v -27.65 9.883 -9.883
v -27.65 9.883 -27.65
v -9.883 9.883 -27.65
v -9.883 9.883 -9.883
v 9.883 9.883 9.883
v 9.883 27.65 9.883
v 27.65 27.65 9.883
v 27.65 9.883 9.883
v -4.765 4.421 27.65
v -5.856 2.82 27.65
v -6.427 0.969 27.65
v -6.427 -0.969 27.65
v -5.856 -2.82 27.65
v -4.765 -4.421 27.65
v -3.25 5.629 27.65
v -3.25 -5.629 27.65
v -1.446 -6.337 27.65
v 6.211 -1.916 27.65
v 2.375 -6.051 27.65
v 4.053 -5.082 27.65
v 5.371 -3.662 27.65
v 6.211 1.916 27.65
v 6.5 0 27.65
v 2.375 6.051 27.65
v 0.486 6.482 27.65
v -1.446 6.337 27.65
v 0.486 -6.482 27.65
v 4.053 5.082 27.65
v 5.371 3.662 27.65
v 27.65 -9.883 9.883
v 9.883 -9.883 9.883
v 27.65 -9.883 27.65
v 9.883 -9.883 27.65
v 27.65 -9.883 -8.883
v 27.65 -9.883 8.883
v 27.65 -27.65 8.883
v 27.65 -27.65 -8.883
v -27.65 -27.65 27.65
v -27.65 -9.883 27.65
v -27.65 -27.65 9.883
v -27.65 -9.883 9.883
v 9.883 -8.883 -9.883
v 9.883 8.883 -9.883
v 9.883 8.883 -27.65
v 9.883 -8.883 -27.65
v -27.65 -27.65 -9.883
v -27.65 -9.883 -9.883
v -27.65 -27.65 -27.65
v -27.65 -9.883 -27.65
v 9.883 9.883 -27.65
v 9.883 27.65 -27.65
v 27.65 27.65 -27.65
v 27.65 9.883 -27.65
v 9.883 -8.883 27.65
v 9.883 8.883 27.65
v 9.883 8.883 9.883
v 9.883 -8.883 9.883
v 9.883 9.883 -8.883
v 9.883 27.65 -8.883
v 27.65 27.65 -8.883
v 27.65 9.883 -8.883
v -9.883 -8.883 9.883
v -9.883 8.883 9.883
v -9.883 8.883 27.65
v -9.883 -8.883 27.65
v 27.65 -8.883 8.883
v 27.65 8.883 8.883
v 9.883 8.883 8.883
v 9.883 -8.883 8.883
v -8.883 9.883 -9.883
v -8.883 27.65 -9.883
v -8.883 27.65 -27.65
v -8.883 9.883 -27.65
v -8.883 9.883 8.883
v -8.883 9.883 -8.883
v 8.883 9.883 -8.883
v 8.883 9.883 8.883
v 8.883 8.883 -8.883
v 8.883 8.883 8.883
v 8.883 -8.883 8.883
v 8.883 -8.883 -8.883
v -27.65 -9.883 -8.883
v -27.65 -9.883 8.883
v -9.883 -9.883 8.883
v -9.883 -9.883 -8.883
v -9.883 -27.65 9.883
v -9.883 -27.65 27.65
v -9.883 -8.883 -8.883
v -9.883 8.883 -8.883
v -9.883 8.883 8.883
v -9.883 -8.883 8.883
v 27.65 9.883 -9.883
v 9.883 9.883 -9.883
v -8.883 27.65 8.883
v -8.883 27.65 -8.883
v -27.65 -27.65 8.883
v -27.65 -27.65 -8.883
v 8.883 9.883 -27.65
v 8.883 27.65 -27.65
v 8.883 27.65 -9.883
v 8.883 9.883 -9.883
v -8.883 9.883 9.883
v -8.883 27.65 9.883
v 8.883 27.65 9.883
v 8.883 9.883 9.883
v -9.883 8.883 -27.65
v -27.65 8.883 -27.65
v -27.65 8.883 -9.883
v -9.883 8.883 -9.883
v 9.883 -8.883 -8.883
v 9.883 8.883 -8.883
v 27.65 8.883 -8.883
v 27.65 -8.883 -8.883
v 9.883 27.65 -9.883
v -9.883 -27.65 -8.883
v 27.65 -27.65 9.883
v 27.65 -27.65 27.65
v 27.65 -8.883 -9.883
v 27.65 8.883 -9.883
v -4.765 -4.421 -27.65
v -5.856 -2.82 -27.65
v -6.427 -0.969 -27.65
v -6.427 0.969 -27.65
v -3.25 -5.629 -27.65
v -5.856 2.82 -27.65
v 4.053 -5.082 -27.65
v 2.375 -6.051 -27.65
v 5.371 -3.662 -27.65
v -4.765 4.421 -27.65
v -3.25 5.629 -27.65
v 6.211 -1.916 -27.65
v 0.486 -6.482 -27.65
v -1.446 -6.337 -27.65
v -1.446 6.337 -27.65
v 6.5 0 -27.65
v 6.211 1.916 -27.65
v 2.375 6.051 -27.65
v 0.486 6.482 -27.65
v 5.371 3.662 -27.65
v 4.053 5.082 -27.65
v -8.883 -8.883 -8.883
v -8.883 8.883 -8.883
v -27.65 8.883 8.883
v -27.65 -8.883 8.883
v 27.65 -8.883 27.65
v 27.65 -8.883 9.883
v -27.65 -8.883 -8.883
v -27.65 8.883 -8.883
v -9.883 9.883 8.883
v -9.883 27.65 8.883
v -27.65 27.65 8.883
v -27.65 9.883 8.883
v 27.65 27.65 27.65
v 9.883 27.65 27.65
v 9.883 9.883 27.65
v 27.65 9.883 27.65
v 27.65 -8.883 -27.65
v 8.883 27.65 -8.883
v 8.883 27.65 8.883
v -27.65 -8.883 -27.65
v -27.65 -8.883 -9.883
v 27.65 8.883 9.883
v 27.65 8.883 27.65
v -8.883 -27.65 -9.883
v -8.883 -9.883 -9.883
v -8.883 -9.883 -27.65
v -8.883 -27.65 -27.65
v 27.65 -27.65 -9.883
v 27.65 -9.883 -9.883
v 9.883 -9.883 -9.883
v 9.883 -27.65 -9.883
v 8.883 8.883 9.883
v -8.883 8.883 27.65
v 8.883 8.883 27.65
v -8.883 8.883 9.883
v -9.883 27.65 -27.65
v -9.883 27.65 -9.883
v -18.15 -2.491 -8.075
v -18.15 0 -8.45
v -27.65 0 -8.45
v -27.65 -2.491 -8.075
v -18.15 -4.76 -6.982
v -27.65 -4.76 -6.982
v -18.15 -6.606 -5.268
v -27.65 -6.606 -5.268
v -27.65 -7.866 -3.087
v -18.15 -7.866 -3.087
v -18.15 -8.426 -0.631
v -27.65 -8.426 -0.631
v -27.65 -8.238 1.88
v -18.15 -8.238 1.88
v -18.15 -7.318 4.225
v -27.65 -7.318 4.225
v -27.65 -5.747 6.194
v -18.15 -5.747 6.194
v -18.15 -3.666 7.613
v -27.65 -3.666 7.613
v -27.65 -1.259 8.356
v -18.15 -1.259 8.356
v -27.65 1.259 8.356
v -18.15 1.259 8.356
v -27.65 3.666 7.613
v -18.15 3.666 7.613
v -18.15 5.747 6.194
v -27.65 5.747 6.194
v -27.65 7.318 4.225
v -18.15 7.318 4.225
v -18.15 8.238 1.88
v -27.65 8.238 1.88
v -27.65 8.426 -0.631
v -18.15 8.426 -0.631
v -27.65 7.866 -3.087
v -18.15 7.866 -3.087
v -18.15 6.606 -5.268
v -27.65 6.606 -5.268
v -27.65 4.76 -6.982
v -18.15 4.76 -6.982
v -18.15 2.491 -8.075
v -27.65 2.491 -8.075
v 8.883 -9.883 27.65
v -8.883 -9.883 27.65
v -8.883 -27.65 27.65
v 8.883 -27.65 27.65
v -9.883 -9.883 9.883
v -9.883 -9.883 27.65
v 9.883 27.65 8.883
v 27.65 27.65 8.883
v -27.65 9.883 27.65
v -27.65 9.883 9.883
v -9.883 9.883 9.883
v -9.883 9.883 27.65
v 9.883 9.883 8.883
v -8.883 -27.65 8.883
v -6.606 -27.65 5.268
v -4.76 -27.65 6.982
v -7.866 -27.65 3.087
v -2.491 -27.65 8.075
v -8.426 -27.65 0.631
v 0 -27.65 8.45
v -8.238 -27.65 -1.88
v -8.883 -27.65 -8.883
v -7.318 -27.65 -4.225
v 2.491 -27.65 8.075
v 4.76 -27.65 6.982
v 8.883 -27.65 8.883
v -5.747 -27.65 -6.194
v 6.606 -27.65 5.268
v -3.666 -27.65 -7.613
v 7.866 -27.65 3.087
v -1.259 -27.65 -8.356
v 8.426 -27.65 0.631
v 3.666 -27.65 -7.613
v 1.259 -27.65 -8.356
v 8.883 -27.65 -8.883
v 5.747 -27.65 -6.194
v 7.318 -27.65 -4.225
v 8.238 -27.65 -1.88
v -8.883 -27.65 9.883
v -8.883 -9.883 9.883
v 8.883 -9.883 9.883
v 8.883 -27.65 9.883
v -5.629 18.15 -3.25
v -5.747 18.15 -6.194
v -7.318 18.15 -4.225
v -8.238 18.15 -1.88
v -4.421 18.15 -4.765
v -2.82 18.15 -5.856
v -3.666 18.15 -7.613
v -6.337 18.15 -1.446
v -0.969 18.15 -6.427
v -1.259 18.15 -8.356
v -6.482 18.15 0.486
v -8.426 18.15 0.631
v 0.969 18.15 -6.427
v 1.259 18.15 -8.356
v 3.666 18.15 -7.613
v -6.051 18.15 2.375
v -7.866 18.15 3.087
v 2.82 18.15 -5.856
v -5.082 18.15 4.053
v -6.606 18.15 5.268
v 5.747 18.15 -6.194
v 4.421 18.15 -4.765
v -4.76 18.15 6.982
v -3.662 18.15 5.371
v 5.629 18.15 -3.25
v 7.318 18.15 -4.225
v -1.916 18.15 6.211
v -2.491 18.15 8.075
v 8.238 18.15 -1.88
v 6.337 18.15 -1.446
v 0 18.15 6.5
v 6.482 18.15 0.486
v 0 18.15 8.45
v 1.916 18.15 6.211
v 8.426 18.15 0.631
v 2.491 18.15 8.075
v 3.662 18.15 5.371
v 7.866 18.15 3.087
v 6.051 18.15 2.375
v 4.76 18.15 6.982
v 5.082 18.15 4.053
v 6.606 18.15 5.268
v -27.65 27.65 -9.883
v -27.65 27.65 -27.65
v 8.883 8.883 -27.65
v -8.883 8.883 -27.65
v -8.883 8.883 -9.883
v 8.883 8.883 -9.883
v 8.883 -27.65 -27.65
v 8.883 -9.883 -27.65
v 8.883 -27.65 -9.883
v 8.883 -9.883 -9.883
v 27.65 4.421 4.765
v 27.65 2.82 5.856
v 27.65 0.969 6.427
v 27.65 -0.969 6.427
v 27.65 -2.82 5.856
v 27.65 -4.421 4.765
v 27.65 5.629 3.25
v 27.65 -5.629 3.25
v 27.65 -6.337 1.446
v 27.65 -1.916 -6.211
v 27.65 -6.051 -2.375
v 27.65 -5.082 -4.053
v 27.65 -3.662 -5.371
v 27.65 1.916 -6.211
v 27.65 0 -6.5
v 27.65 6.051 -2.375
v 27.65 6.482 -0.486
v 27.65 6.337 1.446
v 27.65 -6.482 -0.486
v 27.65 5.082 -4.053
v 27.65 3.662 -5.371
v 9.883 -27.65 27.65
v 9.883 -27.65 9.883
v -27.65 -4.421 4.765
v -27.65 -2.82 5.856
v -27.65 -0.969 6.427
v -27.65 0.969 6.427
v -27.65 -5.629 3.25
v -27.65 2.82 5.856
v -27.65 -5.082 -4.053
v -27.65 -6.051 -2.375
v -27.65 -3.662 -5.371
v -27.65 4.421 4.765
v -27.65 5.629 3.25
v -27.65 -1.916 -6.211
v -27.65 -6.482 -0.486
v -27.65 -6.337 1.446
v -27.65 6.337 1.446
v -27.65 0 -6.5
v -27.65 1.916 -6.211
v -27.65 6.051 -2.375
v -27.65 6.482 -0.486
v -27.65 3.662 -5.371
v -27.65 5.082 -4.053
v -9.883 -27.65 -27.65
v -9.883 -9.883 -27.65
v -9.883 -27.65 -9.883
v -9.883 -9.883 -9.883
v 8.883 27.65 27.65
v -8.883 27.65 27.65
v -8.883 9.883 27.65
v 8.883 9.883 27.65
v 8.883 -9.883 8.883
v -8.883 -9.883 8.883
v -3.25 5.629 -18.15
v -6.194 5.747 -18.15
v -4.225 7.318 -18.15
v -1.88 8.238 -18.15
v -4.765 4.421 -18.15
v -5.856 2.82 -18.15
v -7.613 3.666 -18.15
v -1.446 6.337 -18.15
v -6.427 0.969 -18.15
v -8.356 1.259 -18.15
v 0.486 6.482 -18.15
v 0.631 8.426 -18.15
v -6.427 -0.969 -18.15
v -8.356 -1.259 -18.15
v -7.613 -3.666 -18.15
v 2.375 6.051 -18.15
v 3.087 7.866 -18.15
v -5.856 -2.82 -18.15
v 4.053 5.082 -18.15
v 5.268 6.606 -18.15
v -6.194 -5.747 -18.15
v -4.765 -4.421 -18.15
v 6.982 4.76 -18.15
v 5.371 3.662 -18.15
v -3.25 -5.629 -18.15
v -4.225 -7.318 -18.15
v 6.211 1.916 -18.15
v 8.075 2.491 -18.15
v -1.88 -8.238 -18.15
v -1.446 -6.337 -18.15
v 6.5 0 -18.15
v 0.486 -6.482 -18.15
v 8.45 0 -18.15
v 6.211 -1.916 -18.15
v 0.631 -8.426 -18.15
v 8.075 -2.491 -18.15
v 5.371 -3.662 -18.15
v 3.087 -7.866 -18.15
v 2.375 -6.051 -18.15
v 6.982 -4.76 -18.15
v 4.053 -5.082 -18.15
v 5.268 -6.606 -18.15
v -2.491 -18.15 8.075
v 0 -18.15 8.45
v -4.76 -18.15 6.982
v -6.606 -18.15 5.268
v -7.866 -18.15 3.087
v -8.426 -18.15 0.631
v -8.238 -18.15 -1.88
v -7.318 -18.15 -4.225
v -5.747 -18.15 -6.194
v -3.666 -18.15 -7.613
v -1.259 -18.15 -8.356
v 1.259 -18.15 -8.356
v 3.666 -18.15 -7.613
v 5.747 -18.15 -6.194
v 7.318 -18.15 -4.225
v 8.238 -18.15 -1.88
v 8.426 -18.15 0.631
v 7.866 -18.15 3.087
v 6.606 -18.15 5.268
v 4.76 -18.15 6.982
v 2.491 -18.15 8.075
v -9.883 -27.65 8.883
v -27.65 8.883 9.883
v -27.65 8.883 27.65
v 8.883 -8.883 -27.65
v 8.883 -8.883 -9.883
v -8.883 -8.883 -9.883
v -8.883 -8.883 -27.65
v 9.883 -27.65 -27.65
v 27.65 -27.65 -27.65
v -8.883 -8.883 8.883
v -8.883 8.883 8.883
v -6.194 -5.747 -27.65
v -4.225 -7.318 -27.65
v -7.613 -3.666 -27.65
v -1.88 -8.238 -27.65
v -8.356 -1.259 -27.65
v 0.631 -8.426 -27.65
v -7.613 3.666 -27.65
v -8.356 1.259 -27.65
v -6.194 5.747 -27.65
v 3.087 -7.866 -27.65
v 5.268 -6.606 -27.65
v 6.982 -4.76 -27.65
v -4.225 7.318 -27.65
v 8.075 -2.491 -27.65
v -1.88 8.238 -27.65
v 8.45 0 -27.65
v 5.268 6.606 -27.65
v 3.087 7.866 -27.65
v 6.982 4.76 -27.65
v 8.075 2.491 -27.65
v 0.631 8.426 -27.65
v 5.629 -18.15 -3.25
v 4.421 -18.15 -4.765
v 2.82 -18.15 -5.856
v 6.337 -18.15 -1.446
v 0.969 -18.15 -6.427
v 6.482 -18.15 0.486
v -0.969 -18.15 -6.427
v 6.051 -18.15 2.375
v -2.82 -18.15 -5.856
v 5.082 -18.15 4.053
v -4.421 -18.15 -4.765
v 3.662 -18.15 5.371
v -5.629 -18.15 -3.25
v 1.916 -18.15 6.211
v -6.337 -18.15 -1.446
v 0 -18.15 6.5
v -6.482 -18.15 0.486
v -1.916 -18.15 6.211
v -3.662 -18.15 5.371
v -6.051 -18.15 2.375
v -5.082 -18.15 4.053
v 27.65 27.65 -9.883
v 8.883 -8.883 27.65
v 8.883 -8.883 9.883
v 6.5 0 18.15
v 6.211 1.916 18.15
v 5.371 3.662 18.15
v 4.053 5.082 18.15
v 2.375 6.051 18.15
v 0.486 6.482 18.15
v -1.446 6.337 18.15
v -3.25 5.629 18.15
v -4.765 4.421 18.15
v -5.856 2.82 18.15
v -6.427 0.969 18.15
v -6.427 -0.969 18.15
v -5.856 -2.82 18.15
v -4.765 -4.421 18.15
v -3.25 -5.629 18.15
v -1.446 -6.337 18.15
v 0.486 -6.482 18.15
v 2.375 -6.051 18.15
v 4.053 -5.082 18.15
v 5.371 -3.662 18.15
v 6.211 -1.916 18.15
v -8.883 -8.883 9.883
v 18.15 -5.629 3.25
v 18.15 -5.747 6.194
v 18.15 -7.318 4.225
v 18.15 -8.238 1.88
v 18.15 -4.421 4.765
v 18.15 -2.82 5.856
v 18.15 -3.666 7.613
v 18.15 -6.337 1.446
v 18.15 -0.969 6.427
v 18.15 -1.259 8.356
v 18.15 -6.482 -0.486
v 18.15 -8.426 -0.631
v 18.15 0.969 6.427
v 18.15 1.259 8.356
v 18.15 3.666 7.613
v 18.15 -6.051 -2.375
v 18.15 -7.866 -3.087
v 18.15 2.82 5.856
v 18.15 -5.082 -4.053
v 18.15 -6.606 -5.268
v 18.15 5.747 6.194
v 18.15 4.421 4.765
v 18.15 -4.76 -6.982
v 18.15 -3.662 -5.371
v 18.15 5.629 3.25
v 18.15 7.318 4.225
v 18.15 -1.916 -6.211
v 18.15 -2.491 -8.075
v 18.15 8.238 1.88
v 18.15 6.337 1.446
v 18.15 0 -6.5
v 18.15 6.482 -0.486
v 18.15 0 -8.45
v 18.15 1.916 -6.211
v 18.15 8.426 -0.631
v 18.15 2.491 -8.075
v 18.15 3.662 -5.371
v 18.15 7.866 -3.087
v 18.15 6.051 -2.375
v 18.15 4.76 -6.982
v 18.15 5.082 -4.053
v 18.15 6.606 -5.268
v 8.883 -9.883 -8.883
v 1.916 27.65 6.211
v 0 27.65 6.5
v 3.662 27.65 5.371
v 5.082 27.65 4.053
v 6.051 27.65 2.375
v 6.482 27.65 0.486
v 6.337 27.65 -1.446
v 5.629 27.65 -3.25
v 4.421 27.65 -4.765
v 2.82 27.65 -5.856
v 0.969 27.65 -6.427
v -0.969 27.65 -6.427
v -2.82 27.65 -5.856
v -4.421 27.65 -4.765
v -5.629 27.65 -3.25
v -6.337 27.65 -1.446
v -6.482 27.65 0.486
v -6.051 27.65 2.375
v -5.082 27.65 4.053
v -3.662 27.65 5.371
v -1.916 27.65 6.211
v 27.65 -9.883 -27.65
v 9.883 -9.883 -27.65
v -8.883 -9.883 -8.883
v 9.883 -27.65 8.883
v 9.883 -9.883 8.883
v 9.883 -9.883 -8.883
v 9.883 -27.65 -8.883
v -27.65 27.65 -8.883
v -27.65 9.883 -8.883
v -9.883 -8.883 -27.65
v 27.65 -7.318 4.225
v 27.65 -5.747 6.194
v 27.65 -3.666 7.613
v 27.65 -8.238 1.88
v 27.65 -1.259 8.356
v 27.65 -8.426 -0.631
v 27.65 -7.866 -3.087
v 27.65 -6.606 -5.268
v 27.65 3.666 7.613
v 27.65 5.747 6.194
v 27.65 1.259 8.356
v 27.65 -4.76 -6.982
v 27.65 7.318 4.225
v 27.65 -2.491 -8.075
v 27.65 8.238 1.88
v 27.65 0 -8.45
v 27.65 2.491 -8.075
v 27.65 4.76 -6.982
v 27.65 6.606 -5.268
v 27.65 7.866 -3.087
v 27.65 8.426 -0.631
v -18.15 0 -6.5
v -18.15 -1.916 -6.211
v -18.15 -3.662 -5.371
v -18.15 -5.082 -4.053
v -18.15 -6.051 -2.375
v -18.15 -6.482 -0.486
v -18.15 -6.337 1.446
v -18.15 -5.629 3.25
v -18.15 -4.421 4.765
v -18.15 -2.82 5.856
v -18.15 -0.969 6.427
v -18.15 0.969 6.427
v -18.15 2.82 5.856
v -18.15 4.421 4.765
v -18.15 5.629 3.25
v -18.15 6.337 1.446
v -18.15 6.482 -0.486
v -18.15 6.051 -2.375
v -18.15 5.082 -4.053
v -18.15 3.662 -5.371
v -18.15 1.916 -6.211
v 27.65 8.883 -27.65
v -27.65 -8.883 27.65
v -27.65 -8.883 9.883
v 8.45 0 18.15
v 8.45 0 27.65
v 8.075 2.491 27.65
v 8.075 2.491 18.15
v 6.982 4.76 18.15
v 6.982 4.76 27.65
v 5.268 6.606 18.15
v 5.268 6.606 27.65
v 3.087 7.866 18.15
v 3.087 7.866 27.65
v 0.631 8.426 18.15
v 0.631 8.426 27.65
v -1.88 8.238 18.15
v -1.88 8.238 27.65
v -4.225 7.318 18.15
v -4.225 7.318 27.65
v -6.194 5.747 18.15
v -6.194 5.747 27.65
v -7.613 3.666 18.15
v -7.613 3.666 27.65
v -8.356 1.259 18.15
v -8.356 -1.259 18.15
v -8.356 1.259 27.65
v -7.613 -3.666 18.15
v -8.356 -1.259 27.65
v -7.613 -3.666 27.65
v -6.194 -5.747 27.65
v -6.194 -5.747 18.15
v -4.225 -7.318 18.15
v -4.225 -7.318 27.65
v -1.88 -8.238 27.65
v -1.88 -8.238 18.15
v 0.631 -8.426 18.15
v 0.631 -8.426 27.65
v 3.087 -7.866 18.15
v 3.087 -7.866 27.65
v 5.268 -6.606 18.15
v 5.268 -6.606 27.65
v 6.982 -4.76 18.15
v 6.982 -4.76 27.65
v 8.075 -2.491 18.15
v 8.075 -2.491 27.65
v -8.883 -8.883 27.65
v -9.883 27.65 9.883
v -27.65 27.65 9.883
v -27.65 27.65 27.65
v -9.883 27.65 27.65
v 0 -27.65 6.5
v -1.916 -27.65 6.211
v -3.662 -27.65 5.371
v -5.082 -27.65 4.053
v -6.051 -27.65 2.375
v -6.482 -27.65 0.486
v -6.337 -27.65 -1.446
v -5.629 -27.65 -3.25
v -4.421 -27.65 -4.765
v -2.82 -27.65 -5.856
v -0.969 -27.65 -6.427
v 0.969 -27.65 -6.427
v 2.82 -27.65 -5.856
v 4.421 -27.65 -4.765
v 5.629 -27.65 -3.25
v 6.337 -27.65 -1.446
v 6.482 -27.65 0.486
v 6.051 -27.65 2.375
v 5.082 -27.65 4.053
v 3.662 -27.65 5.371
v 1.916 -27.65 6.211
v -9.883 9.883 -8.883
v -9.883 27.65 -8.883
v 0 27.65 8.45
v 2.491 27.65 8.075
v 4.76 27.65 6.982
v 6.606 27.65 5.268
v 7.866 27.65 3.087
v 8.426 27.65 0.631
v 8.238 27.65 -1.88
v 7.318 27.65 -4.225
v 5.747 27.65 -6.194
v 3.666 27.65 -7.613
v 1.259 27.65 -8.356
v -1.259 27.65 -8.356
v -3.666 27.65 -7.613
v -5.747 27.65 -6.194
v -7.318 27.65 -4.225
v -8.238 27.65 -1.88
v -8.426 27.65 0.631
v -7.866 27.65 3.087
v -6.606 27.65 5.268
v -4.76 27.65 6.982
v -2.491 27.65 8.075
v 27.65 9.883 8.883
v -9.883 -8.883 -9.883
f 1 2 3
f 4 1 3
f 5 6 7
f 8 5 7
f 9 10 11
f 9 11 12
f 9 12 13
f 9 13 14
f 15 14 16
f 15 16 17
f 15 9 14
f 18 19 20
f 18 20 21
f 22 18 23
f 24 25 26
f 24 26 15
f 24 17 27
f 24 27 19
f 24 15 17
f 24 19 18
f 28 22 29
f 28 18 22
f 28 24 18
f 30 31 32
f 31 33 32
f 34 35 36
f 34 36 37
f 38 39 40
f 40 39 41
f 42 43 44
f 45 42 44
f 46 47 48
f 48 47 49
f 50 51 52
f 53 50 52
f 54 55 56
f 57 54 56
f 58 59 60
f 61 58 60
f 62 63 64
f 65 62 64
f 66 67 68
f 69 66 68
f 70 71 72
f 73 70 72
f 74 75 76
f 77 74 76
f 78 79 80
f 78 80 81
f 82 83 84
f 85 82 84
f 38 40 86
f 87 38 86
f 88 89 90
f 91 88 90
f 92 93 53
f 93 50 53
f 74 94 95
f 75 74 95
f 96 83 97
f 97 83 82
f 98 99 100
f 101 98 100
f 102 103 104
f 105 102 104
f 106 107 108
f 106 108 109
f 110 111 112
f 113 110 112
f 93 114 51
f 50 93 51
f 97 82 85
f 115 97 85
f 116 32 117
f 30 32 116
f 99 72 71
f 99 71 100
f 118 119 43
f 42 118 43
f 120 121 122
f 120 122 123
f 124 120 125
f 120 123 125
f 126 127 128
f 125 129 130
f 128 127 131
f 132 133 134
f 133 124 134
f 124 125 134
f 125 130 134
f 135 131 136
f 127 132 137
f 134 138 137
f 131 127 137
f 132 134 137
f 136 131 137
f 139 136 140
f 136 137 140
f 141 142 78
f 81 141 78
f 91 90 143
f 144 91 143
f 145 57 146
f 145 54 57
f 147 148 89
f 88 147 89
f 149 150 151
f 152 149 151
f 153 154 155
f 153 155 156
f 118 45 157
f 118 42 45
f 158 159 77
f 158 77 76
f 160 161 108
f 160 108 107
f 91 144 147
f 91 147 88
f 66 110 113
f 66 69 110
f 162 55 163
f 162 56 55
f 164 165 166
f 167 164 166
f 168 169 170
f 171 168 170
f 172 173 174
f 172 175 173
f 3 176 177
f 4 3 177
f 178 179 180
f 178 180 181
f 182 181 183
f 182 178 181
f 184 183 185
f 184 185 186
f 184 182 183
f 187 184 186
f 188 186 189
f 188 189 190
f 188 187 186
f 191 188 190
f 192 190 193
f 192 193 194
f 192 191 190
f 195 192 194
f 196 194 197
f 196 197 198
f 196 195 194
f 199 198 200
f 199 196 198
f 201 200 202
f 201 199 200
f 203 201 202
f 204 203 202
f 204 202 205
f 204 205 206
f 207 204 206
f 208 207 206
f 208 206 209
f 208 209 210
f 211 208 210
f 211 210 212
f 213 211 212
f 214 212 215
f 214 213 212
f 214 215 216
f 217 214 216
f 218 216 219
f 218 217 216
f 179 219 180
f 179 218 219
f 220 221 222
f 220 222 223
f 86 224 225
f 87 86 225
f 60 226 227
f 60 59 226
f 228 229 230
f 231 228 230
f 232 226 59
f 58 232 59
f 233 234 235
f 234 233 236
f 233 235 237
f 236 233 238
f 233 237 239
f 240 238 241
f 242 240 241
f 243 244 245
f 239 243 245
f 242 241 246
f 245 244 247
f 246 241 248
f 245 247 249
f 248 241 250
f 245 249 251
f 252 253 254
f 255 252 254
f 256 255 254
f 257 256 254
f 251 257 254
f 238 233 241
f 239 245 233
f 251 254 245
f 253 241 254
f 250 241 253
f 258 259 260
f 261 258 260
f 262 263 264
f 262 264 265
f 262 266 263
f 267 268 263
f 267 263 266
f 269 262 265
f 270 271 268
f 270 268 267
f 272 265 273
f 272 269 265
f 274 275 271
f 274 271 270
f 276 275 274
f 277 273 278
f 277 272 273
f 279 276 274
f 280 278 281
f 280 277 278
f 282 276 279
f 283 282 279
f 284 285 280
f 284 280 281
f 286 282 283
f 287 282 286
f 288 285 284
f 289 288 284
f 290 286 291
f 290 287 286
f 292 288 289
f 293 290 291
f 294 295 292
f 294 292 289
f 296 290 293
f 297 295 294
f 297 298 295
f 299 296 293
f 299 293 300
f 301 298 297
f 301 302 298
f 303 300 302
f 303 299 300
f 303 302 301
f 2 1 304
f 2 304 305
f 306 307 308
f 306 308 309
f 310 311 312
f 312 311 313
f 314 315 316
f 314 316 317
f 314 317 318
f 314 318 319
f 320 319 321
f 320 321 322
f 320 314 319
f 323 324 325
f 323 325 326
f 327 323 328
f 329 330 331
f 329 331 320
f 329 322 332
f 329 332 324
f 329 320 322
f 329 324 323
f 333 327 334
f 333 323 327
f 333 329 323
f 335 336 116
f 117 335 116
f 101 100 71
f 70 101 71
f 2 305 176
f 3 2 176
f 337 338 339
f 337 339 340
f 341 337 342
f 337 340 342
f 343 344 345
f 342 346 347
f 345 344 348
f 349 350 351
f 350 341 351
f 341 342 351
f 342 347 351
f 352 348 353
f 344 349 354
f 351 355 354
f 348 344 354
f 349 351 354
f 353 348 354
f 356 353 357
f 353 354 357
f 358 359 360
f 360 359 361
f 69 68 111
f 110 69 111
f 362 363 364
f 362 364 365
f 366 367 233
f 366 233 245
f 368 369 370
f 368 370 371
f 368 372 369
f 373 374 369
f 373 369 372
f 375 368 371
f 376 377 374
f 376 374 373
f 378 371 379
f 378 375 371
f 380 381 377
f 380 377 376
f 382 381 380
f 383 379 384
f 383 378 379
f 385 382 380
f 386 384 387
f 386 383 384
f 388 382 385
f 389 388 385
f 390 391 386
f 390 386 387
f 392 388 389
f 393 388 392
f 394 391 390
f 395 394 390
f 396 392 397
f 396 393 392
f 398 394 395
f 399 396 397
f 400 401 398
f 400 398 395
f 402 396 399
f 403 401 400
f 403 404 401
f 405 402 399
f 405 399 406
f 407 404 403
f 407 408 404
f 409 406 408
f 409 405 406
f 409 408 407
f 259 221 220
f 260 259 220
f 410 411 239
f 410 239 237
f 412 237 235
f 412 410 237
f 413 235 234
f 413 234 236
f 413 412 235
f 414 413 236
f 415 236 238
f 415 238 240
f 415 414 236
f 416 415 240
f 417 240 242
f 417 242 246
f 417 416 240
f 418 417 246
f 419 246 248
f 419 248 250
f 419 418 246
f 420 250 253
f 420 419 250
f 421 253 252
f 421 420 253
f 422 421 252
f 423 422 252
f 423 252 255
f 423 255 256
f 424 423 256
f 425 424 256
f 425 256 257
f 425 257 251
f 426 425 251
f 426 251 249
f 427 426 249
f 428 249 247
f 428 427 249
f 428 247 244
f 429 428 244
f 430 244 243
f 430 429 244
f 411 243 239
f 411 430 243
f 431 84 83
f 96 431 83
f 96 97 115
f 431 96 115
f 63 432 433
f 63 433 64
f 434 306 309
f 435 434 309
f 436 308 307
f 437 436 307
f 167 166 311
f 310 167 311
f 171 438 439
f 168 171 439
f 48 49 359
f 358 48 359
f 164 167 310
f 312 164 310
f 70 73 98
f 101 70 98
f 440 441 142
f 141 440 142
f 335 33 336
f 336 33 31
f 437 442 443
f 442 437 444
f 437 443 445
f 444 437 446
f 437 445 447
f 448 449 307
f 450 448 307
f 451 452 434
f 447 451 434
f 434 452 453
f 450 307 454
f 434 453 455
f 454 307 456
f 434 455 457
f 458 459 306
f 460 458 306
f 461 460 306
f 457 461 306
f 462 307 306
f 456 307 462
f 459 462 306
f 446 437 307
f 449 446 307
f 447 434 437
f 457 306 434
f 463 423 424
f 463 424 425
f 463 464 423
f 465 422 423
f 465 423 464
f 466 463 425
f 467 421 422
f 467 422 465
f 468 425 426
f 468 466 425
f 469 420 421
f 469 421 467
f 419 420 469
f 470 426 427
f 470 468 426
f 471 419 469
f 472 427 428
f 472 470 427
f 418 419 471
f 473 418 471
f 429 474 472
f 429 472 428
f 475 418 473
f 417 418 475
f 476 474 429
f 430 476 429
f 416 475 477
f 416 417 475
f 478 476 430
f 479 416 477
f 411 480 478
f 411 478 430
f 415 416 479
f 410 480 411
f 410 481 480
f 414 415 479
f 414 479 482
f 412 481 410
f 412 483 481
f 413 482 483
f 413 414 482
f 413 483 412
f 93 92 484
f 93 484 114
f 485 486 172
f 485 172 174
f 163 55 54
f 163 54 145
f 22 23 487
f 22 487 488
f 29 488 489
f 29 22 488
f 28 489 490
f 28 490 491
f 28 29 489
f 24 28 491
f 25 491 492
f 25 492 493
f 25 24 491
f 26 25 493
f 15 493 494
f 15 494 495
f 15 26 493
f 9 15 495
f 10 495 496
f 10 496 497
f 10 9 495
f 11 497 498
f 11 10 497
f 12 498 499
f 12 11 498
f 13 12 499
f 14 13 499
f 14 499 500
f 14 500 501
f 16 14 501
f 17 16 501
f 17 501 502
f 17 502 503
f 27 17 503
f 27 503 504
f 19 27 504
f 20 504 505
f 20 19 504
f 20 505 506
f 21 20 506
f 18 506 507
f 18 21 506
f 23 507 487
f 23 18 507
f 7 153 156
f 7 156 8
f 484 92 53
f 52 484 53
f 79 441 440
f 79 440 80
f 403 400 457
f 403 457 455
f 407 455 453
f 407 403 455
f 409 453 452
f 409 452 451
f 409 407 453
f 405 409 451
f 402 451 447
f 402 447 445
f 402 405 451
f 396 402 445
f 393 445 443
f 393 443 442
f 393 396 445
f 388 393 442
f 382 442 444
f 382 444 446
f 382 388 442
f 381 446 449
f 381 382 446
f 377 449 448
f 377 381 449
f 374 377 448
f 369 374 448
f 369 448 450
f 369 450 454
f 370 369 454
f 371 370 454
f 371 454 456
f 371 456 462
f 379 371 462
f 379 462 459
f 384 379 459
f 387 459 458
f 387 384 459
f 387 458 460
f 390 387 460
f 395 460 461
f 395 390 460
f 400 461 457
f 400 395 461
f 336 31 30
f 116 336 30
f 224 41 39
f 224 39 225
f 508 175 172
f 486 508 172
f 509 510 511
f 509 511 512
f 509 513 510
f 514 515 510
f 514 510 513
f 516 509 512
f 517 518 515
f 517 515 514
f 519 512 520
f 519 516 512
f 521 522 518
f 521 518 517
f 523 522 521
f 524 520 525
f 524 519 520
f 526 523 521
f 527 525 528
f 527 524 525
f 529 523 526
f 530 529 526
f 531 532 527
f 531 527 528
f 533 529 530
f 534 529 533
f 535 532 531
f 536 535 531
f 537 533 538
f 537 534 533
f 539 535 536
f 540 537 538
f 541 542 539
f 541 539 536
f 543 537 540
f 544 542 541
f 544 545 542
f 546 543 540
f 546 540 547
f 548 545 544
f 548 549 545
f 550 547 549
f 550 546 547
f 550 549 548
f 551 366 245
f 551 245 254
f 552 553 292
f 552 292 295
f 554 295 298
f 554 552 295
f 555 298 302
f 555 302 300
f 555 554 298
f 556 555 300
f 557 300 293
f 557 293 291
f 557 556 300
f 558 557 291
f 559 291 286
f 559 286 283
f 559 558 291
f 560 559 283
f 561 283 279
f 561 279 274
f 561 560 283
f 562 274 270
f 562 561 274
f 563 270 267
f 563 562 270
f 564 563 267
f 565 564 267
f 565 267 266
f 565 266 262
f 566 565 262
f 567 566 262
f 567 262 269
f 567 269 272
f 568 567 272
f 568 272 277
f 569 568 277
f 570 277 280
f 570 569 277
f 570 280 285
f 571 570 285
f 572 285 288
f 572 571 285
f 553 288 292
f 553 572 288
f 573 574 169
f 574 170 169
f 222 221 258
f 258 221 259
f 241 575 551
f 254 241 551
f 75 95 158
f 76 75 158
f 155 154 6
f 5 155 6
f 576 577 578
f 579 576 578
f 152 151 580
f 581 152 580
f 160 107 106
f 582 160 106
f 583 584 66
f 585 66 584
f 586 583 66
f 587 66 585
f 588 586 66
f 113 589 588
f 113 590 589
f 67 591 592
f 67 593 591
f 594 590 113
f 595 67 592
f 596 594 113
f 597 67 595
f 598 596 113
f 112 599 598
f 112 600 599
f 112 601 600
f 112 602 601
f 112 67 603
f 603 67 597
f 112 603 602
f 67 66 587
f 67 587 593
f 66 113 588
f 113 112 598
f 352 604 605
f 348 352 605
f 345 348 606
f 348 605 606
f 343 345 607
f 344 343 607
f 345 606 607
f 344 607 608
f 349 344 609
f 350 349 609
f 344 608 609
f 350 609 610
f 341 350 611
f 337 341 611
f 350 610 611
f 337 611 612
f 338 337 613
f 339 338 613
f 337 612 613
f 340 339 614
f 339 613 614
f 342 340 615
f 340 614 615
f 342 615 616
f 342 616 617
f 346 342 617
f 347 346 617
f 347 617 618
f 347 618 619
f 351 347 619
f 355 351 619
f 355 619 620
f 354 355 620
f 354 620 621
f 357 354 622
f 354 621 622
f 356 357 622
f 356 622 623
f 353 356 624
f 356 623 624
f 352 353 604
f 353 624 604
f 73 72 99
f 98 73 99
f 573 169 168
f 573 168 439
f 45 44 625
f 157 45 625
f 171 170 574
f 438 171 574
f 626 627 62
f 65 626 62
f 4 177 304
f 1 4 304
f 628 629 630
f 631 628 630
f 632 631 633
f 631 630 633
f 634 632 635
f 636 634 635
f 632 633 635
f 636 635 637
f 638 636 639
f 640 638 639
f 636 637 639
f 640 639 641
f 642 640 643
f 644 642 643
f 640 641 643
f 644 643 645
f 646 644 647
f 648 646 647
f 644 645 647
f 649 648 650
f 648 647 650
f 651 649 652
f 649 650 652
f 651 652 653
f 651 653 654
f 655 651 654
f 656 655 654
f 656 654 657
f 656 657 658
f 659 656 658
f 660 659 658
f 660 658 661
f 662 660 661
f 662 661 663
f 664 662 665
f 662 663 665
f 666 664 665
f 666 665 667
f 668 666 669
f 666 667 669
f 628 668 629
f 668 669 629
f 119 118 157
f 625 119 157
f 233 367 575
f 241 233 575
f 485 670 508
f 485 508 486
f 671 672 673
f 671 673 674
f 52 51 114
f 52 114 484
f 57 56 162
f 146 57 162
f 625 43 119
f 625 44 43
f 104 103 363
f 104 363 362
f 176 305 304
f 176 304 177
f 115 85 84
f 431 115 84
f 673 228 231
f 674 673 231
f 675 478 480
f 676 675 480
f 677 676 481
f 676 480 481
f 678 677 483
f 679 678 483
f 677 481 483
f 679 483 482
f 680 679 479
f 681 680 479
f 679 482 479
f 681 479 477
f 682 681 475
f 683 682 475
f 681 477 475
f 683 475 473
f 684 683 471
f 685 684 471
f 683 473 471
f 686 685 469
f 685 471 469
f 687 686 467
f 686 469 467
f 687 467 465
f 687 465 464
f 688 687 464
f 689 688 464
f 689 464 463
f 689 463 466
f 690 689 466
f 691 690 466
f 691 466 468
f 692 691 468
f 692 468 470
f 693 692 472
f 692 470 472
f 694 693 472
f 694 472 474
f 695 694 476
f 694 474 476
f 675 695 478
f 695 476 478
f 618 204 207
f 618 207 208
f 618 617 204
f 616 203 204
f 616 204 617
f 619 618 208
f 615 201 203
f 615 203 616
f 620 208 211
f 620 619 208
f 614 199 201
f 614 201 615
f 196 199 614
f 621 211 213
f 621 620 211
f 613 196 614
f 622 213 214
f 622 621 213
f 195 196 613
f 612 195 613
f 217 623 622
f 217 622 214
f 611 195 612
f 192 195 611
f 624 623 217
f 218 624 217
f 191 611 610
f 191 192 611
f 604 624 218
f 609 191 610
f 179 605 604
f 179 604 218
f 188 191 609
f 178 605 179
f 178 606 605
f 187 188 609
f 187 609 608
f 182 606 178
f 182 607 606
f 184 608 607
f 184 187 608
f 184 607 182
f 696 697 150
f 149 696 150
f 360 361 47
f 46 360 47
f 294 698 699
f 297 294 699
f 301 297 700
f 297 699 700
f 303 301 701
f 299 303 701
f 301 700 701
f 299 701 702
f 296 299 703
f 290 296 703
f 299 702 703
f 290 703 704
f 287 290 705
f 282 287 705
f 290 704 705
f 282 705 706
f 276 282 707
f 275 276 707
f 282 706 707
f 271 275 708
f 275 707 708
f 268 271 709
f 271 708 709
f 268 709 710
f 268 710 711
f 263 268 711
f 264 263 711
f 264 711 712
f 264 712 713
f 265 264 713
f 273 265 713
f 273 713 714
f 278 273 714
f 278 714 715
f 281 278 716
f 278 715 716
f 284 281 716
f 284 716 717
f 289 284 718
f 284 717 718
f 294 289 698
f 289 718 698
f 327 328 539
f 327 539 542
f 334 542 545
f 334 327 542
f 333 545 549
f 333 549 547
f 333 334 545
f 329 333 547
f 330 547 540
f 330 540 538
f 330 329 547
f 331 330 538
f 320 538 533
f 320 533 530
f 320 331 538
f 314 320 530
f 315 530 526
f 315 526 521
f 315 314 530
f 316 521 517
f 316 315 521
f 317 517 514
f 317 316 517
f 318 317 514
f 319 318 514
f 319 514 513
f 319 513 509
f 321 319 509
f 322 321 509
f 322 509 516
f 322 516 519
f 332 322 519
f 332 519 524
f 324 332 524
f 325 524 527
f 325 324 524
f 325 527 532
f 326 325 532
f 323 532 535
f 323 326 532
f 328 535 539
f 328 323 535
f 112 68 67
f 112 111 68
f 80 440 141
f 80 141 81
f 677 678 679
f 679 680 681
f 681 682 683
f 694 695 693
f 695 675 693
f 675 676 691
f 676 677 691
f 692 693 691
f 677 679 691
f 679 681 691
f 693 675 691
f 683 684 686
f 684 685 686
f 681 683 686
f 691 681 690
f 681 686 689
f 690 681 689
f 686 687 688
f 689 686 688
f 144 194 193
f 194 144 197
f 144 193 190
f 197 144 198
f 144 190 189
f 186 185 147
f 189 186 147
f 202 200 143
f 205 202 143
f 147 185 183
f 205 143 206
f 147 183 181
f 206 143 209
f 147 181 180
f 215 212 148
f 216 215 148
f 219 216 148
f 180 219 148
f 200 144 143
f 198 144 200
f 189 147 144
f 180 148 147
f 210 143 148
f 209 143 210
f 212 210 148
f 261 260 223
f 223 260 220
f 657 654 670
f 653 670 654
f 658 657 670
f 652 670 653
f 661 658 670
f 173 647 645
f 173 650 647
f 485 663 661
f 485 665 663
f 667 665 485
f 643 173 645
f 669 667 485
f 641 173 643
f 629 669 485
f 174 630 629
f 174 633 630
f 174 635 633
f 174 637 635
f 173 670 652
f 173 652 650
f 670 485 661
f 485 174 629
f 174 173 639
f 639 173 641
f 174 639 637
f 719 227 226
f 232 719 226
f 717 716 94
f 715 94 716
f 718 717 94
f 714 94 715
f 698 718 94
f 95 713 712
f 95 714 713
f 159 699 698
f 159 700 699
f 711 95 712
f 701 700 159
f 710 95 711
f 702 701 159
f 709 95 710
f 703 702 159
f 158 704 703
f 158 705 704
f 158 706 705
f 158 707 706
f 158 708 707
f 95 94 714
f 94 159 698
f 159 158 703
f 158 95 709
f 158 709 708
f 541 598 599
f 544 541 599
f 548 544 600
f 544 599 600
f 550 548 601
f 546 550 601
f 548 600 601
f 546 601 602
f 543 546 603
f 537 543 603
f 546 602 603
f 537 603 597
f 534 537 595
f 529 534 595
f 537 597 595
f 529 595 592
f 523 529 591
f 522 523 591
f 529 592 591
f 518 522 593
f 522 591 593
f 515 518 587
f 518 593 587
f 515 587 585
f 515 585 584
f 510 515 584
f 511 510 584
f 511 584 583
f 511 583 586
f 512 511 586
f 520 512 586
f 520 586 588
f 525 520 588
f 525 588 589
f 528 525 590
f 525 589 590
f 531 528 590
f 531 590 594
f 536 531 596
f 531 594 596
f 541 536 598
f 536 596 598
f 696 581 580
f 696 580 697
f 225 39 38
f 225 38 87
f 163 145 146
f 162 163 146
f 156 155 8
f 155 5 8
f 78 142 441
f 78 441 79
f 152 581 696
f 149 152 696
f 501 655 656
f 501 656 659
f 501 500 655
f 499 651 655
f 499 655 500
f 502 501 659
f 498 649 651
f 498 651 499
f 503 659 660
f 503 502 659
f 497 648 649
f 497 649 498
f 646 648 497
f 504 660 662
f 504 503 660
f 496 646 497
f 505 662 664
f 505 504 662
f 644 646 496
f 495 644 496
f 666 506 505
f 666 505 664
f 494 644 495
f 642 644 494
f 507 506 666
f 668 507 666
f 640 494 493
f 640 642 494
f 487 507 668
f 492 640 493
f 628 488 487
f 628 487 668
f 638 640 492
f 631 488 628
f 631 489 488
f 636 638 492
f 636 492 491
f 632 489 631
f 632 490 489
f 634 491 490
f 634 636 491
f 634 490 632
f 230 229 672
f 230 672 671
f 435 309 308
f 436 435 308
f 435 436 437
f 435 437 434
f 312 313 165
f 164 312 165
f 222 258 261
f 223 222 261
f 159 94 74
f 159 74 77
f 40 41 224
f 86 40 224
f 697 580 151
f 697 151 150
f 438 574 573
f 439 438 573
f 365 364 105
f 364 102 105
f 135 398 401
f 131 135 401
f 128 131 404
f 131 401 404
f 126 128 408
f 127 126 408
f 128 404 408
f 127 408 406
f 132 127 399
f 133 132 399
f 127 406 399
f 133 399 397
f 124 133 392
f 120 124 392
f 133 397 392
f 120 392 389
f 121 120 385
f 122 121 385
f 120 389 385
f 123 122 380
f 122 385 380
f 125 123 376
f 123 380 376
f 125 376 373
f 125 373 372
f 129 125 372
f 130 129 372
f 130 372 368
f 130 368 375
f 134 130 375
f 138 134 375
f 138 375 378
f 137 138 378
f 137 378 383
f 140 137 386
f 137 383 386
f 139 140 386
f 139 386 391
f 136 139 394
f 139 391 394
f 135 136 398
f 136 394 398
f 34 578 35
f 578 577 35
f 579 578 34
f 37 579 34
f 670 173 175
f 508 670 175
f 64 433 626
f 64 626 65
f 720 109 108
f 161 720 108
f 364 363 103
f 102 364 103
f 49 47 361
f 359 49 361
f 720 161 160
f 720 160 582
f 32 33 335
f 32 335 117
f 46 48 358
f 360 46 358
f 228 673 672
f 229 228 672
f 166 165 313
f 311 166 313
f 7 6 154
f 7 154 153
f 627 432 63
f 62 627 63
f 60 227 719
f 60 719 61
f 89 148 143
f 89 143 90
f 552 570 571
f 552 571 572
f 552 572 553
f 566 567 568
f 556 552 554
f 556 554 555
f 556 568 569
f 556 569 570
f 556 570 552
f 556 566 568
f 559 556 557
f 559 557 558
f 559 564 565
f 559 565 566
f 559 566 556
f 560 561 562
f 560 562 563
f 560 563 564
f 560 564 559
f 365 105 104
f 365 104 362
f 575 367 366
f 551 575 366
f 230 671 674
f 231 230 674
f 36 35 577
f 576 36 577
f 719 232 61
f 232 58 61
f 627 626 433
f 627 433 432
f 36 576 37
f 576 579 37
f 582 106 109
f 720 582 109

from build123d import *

# Parameters (mm, degrees)
SKETCH1_W           = 55.3
SKETCH1_H           = 55.3
BOSS_EXTRUDE1_DEPTH = 27.65
SKETCH2_R           = 8.45
SKETCH2_R_2         = 6.5
CUT_EXTRUDE2_DEPTH  = 9.5
CUT_EXTRUDE3_START  = -9.5
SKETCH3_R           = 8.45
SKETCH3_R_2         = 6.5
CUT_EXTRUDE3_DEPTH  = 9.5
SKETCH4_R           = 8.45
SKETCH4_R_2         = 6.5
CUT_EXTRUDE4_DEPTH  = 9.5
CUT_EXTRUDE5_START  = -9.5
SKETCH5_R           = 8.45
SKETCH5_R_2         = 6.5
CUT_EXTRUDE5_DEPTH  = 9.5
SKETCH6_R           = 8.45
SKETCH6_R_2         = 6.5
CUT_EXTRUDE6_DEPTH  = 9.5
CUT_EXTRUDE7_START  = -9.5
SKETCH7_R           = 8.45
SKETCH7_R_2         = 6.5
CUT_EXTRUDE7_DEPTH  = 9.5
SKETCH8_W           = 17.76666667
SKETCH8_H           = 17.76666667
CUT_EXTRUDE8_DEPTH  = 30
SKETCH10_W          = 55.3
SKETCH10_H          = 1
CUT_EXTRUDE9_DEPTH  = 60


with BuildPart() as part:
    # Sketch1 → Boss-Extrude1 (new, symmetric)
    with BuildSketch(Plane(origin=(0, 0, 0), x_dir=(1, 0, 0), z_dir=(0, 1, 0))):
        Rectangle(SKETCH1_W, SKETCH1_H)
    extrude(amount=BOSS_EXTRUDE1_DEPTH, both=True)

    # Sketch2 → Cut-Extrude2 (cut)
    with BuildSketch(Plane(origin=(0, 27.65, 0), x_dir=(1, 0, 0), z_dir=(0, 1, 0))):
        with Locations(Location((0, 0, 0), (0, 0, 270))):
            Circle(SKETCH2_R)
        with Locations(Location((0, 0, 0), (0, 0, 270))):
            Circle(SKETCH2_R_2, mode=Mode.SUBTRACT)
    extrude(amount=-CUT_EXTRUDE2_DEPTH, mode=Mode.SUBTRACT)

    # Sketch3 → Cut-Extrude3 (cut)
    with BuildSketch(Plane.XZ.offset(27.65).offset(CUT_EXTRUDE3_START)):
        with Locations(Location((0, 0, 0), (0, 0, 90))):
            Circle(SKETCH3_R)
        with Locations(Location((0, 0, 0), (0, 0, 90))):
            Circle(SKETCH3_R_2, mode=Mode.SUBTRACT)
    extrude(amount=CUT_EXTRUDE3_DEPTH, mode=Mode.SUBTRACT)

    # Sketch4 → Cut-Extrude4 (cut)
    with BuildSketch(Plane(origin=(27.65, 0, 0), x_dir=(0, 0, -1), z_dir=(1, 0, 0))):
        Circle(SKETCH4_R)
        Circle(SKETCH4_R_2, mode=Mode.SUBTRACT)
    extrude(amount=-CUT_EXTRUDE4_DEPTH, mode=Mode.SUBTRACT)

    # Sketch5 → Cut-Extrude5 (cut)
    with BuildSketch(Plane.ZY.offset(27.65).offset(CUT_EXTRUDE5_START)):
        with Locations(Location((0, 0, 0), (0, 0, 180))):
            Circle(SKETCH5_R)
        with Locations(Location((0, 0, 0), (0, 0, 180))):
            Circle(SKETCH5_R_2, mode=Mode.SUBTRACT)
    extrude(amount=CUT_EXTRUDE5_DEPTH, mode=Mode.SUBTRACT)

    # Sketch6 → Cut-Extrude6 (cut)
    with BuildSketch(Plane.XY.offset(27.65)):
        Circle(SKETCH6_R)
        Circle(SKETCH6_R_2, mode=Mode.SUBTRACT)
    extrude(amount=-CUT_EXTRUDE6_DEPTH, mode=Mode.SUBTRACT)

    # Sketch7 → Cut-Extrude7 (cut)
    with BuildSketch(Plane(origin=(0, 0, -27.65), x_dir=(-1, 0, 0), z_dir=(0, 0, -1)).offset(CUT_EXTRUDE7_START)):
        with Locations(Location((0, 0, 0), (0, 0, 180))):
            Circle(SKETCH7_R)
        with Locations(Location((0, 0, 0), (0, 0, 180))):
            Circle(SKETCH7_R_2, mode=Mode.SUBTRACT)
    extrude(amount=CUT_EXTRUDE7_DEPTH, mode=Mode.SUBTRACT)

    # Sketch8 → Cut-Extrude8 (cut, symmetric)
    with BuildSketch(Plane(origin=(0, 0, 0), x_dir=(1, 0, 0), z_dir=(0, 1, 0))):
        Polygon((-9.88333333, 27.65), (-9.88333333, 9.883333333), (-27.65, 9.883333333), (-27.65, 8.883333333), (-9.88333334, 8.883333333), (-9.88333334, -8.883333337), (-27.65, -8.883333337), (-27.65, -9.883333337), (-9.88333334, -9.883333337), (-9.88333334, -27.650000007), (-8.88333334, -27.65), (-8.88333334, -9.883333337), (8.88333333, -9.883333337), (8.88333333, -27.65), (9.88333333, -27.65), (9.88333333, -9.883333337), (27.65, -9.883333337), (27.65, -8.883333337), (9.88333333, -8.883333337), (9.88333333, 8.883333333), (27.65, 8.883333333), (27.65, 9.883333333), (9.88333334, 9.883333333), (9.88333334, 27.65), (8.88333334, 27.65), (8.88333334, 9.883333333), (-8.88333333, 9.883333333), (-8.88333333, 27.65), align=None)
        with Locations((-5e-09, -2e-09)):
            Rectangle(SKETCH8_W, SKETCH8_H, mode=Mode.SUBTRACT)
    extrude(amount=CUT_EXTRUDE8_DEPTH, both=True, mode=Mode.SUBTRACT)


with BuildPart() as cut_extrude8_piece_1:
    # of the separate pieces the step leaves, piece 1, a body of its own (cut_extrude8_pieces)
    add(part.part.solids().sort_by_distance((-27.65, -27.65, -27.65))[0])


with BuildPart() as cut_extrude8_piece_2:
    # of the separate pieces the step leaves, piece 2, a body of its own (cut_extrude8_pieces)
    add(part.part.solids().sort_by_distance((27.65, 27.65, 9.883333337))[0])


with BuildPart() as cut_extrude8_piece_3:
    # of the separate pieces the step leaves, piece 3, a body of its own (cut_extrude8_pieces)
    add(part.part.solids().sort_by_distance((9.88333334, 27.65, -27.65))[0])


with BuildPart() as cut_extrude8_piece_4:
    # of the separate pieces the step leaves, piece 4, a body of its own (cut_extrude8_pieces)
    add(part.part.solids().sort_by_distance((-27.65, 27.65, 27.65))[0])


with BuildPart() as cut_extrude8_piece_5:
    # of the separate pieces the step leaves, piece 5, a body of its own (cut_extrude8_pieces)
    add(part.part.solids().sort_by_distance((27.65, 27.65, -8.883333333))[0])


with BuildPart() as cut_extrude8_piece_6:
    # of the separate pieces the step leaves, piece 6, a body of its own (cut_extrude8_pieces)
    add(part.part.solids().sort_by_distance((-8.88333333, 27.65, -27.65))[0])


with BuildPart() as cut_extrude8_piece_7:
    # of the separate pieces the step leaves, piece 7, a body of its own (cut_extrude8_pieces)
    add(part.part.solids().sort_by_distance((8.88333333, 27.65, 27.65))[0])


with BuildPart() as cut_extrude8_piece_8:
    # of the separate pieces the step leaves, piece 8, a body of its own (cut_extrude8_pieces)
    add(part.part.solids().sort_by_distance((-27.65, -27.65, 8.883333337))[0])


with BuildPart() as cut_extrude8_piece_9:
    # of the separate pieces the step leaves, piece 9, a body of its own (cut_extrude8_pieces)
    add(part.part.solids().sort_by_distance((-8.88333334, 27.65, -8.883333333))[0])


with BuildPart() as cut_extrude9_tool:
    # Sketch10 → Cut-Extrude9 (new, symmetric)
    with BuildSketch(Plane.XY):
        with Locations((0, 9.38333333)):
            Rectangle(SKETCH10_W, SKETCH10_H)
        with Locations((0, -9.38333334)):
            Rectangle(SKETCH10_W, SKETCH10_H)
    extrude(amount=CUT_EXTRUDE9_DEPTH, both=True)


with BuildPart() as cut_extrude8_piece_1_1:
    add(cut_extrude8_piece_1.part)

    # Cut-Extrude9: cut by cut_extrude9_tool
    add(cut_extrude9_tool.part, mode=Mode.SUBTRACT)


with BuildPart() as cut_extrude8_piece_2_1:
    add(cut_extrude8_piece_2.part)

    # Cut-Extrude9: cut by cut_extrude9_tool
    add(cut_extrude9_tool.part, mode=Mode.SUBTRACT)


with BuildPart() as cut_extrude8_piece_3_1:
    add(cut_extrude8_piece_3.part)

    # Cut-Extrude9: cut by cut_extrude9_tool
    add(cut_extrude9_tool.part, mode=Mode.SUBTRACT)


with BuildPart() as cut_extrude8_piece_4_1:
    add(cut_extrude8_piece_4.part)

    # Cut-Extrude9: cut by cut_extrude9_tool
    add(cut_extrude9_tool.part, mode=Mode.SUBTRACT)


with BuildPart() as cut_extrude8_piece_5_1:
    add(cut_extrude8_piece_5.part)

    # Cut-Extrude9: cut by cut_extrude9_tool
    add(cut_extrude9_tool.part, mode=Mode.SUBTRACT)


with BuildPart() as cut_extrude8_piece_6_1:
    add(cut_extrude8_piece_6.part)

    # Cut-Extrude9: cut by cut_extrude9_tool
    add(cut_extrude9_tool.part, mode=Mode.SUBTRACT)


with BuildPart() as cut_extrude8_piece_7_1:
    add(cut_extrude8_piece_7.part)

    # Cut-Extrude9: cut by cut_extrude9_tool
    add(cut_extrude9_tool.part, mode=Mode.SUBTRACT)


with BuildPart() as cut_extrude8_piece_8_1:
    add(cut_extrude8_piece_8.part)

    # Cut-Extrude9: cut by cut_extrude9_tool
    add(cut_extrude9_tool.part, mode=Mode.SUBTRACT)


with BuildPart() as cut_extrude8_piece_9_1:
    add(cut_extrude8_piece_9.part)

    # Cut-Extrude9: cut by cut_extrude9_tool
    add(cut_extrude9_tool.part, mode=Mode.SUBTRACT)


solid = Compound([cut_extrude8_piece_1_1.part, cut_extrude8_piece_2_1.part, cut_extrude8_piece_3_1.part, cut_extrude8_piece_4_1.part, cut_extrude8_piece_5_1.part, cut_extrude8_piece_6_1.part, cut_extrude8_piece_7_1.part, cut_extrude8_piece_8_1.part, cut_extrude8_piece_9_1.part])
